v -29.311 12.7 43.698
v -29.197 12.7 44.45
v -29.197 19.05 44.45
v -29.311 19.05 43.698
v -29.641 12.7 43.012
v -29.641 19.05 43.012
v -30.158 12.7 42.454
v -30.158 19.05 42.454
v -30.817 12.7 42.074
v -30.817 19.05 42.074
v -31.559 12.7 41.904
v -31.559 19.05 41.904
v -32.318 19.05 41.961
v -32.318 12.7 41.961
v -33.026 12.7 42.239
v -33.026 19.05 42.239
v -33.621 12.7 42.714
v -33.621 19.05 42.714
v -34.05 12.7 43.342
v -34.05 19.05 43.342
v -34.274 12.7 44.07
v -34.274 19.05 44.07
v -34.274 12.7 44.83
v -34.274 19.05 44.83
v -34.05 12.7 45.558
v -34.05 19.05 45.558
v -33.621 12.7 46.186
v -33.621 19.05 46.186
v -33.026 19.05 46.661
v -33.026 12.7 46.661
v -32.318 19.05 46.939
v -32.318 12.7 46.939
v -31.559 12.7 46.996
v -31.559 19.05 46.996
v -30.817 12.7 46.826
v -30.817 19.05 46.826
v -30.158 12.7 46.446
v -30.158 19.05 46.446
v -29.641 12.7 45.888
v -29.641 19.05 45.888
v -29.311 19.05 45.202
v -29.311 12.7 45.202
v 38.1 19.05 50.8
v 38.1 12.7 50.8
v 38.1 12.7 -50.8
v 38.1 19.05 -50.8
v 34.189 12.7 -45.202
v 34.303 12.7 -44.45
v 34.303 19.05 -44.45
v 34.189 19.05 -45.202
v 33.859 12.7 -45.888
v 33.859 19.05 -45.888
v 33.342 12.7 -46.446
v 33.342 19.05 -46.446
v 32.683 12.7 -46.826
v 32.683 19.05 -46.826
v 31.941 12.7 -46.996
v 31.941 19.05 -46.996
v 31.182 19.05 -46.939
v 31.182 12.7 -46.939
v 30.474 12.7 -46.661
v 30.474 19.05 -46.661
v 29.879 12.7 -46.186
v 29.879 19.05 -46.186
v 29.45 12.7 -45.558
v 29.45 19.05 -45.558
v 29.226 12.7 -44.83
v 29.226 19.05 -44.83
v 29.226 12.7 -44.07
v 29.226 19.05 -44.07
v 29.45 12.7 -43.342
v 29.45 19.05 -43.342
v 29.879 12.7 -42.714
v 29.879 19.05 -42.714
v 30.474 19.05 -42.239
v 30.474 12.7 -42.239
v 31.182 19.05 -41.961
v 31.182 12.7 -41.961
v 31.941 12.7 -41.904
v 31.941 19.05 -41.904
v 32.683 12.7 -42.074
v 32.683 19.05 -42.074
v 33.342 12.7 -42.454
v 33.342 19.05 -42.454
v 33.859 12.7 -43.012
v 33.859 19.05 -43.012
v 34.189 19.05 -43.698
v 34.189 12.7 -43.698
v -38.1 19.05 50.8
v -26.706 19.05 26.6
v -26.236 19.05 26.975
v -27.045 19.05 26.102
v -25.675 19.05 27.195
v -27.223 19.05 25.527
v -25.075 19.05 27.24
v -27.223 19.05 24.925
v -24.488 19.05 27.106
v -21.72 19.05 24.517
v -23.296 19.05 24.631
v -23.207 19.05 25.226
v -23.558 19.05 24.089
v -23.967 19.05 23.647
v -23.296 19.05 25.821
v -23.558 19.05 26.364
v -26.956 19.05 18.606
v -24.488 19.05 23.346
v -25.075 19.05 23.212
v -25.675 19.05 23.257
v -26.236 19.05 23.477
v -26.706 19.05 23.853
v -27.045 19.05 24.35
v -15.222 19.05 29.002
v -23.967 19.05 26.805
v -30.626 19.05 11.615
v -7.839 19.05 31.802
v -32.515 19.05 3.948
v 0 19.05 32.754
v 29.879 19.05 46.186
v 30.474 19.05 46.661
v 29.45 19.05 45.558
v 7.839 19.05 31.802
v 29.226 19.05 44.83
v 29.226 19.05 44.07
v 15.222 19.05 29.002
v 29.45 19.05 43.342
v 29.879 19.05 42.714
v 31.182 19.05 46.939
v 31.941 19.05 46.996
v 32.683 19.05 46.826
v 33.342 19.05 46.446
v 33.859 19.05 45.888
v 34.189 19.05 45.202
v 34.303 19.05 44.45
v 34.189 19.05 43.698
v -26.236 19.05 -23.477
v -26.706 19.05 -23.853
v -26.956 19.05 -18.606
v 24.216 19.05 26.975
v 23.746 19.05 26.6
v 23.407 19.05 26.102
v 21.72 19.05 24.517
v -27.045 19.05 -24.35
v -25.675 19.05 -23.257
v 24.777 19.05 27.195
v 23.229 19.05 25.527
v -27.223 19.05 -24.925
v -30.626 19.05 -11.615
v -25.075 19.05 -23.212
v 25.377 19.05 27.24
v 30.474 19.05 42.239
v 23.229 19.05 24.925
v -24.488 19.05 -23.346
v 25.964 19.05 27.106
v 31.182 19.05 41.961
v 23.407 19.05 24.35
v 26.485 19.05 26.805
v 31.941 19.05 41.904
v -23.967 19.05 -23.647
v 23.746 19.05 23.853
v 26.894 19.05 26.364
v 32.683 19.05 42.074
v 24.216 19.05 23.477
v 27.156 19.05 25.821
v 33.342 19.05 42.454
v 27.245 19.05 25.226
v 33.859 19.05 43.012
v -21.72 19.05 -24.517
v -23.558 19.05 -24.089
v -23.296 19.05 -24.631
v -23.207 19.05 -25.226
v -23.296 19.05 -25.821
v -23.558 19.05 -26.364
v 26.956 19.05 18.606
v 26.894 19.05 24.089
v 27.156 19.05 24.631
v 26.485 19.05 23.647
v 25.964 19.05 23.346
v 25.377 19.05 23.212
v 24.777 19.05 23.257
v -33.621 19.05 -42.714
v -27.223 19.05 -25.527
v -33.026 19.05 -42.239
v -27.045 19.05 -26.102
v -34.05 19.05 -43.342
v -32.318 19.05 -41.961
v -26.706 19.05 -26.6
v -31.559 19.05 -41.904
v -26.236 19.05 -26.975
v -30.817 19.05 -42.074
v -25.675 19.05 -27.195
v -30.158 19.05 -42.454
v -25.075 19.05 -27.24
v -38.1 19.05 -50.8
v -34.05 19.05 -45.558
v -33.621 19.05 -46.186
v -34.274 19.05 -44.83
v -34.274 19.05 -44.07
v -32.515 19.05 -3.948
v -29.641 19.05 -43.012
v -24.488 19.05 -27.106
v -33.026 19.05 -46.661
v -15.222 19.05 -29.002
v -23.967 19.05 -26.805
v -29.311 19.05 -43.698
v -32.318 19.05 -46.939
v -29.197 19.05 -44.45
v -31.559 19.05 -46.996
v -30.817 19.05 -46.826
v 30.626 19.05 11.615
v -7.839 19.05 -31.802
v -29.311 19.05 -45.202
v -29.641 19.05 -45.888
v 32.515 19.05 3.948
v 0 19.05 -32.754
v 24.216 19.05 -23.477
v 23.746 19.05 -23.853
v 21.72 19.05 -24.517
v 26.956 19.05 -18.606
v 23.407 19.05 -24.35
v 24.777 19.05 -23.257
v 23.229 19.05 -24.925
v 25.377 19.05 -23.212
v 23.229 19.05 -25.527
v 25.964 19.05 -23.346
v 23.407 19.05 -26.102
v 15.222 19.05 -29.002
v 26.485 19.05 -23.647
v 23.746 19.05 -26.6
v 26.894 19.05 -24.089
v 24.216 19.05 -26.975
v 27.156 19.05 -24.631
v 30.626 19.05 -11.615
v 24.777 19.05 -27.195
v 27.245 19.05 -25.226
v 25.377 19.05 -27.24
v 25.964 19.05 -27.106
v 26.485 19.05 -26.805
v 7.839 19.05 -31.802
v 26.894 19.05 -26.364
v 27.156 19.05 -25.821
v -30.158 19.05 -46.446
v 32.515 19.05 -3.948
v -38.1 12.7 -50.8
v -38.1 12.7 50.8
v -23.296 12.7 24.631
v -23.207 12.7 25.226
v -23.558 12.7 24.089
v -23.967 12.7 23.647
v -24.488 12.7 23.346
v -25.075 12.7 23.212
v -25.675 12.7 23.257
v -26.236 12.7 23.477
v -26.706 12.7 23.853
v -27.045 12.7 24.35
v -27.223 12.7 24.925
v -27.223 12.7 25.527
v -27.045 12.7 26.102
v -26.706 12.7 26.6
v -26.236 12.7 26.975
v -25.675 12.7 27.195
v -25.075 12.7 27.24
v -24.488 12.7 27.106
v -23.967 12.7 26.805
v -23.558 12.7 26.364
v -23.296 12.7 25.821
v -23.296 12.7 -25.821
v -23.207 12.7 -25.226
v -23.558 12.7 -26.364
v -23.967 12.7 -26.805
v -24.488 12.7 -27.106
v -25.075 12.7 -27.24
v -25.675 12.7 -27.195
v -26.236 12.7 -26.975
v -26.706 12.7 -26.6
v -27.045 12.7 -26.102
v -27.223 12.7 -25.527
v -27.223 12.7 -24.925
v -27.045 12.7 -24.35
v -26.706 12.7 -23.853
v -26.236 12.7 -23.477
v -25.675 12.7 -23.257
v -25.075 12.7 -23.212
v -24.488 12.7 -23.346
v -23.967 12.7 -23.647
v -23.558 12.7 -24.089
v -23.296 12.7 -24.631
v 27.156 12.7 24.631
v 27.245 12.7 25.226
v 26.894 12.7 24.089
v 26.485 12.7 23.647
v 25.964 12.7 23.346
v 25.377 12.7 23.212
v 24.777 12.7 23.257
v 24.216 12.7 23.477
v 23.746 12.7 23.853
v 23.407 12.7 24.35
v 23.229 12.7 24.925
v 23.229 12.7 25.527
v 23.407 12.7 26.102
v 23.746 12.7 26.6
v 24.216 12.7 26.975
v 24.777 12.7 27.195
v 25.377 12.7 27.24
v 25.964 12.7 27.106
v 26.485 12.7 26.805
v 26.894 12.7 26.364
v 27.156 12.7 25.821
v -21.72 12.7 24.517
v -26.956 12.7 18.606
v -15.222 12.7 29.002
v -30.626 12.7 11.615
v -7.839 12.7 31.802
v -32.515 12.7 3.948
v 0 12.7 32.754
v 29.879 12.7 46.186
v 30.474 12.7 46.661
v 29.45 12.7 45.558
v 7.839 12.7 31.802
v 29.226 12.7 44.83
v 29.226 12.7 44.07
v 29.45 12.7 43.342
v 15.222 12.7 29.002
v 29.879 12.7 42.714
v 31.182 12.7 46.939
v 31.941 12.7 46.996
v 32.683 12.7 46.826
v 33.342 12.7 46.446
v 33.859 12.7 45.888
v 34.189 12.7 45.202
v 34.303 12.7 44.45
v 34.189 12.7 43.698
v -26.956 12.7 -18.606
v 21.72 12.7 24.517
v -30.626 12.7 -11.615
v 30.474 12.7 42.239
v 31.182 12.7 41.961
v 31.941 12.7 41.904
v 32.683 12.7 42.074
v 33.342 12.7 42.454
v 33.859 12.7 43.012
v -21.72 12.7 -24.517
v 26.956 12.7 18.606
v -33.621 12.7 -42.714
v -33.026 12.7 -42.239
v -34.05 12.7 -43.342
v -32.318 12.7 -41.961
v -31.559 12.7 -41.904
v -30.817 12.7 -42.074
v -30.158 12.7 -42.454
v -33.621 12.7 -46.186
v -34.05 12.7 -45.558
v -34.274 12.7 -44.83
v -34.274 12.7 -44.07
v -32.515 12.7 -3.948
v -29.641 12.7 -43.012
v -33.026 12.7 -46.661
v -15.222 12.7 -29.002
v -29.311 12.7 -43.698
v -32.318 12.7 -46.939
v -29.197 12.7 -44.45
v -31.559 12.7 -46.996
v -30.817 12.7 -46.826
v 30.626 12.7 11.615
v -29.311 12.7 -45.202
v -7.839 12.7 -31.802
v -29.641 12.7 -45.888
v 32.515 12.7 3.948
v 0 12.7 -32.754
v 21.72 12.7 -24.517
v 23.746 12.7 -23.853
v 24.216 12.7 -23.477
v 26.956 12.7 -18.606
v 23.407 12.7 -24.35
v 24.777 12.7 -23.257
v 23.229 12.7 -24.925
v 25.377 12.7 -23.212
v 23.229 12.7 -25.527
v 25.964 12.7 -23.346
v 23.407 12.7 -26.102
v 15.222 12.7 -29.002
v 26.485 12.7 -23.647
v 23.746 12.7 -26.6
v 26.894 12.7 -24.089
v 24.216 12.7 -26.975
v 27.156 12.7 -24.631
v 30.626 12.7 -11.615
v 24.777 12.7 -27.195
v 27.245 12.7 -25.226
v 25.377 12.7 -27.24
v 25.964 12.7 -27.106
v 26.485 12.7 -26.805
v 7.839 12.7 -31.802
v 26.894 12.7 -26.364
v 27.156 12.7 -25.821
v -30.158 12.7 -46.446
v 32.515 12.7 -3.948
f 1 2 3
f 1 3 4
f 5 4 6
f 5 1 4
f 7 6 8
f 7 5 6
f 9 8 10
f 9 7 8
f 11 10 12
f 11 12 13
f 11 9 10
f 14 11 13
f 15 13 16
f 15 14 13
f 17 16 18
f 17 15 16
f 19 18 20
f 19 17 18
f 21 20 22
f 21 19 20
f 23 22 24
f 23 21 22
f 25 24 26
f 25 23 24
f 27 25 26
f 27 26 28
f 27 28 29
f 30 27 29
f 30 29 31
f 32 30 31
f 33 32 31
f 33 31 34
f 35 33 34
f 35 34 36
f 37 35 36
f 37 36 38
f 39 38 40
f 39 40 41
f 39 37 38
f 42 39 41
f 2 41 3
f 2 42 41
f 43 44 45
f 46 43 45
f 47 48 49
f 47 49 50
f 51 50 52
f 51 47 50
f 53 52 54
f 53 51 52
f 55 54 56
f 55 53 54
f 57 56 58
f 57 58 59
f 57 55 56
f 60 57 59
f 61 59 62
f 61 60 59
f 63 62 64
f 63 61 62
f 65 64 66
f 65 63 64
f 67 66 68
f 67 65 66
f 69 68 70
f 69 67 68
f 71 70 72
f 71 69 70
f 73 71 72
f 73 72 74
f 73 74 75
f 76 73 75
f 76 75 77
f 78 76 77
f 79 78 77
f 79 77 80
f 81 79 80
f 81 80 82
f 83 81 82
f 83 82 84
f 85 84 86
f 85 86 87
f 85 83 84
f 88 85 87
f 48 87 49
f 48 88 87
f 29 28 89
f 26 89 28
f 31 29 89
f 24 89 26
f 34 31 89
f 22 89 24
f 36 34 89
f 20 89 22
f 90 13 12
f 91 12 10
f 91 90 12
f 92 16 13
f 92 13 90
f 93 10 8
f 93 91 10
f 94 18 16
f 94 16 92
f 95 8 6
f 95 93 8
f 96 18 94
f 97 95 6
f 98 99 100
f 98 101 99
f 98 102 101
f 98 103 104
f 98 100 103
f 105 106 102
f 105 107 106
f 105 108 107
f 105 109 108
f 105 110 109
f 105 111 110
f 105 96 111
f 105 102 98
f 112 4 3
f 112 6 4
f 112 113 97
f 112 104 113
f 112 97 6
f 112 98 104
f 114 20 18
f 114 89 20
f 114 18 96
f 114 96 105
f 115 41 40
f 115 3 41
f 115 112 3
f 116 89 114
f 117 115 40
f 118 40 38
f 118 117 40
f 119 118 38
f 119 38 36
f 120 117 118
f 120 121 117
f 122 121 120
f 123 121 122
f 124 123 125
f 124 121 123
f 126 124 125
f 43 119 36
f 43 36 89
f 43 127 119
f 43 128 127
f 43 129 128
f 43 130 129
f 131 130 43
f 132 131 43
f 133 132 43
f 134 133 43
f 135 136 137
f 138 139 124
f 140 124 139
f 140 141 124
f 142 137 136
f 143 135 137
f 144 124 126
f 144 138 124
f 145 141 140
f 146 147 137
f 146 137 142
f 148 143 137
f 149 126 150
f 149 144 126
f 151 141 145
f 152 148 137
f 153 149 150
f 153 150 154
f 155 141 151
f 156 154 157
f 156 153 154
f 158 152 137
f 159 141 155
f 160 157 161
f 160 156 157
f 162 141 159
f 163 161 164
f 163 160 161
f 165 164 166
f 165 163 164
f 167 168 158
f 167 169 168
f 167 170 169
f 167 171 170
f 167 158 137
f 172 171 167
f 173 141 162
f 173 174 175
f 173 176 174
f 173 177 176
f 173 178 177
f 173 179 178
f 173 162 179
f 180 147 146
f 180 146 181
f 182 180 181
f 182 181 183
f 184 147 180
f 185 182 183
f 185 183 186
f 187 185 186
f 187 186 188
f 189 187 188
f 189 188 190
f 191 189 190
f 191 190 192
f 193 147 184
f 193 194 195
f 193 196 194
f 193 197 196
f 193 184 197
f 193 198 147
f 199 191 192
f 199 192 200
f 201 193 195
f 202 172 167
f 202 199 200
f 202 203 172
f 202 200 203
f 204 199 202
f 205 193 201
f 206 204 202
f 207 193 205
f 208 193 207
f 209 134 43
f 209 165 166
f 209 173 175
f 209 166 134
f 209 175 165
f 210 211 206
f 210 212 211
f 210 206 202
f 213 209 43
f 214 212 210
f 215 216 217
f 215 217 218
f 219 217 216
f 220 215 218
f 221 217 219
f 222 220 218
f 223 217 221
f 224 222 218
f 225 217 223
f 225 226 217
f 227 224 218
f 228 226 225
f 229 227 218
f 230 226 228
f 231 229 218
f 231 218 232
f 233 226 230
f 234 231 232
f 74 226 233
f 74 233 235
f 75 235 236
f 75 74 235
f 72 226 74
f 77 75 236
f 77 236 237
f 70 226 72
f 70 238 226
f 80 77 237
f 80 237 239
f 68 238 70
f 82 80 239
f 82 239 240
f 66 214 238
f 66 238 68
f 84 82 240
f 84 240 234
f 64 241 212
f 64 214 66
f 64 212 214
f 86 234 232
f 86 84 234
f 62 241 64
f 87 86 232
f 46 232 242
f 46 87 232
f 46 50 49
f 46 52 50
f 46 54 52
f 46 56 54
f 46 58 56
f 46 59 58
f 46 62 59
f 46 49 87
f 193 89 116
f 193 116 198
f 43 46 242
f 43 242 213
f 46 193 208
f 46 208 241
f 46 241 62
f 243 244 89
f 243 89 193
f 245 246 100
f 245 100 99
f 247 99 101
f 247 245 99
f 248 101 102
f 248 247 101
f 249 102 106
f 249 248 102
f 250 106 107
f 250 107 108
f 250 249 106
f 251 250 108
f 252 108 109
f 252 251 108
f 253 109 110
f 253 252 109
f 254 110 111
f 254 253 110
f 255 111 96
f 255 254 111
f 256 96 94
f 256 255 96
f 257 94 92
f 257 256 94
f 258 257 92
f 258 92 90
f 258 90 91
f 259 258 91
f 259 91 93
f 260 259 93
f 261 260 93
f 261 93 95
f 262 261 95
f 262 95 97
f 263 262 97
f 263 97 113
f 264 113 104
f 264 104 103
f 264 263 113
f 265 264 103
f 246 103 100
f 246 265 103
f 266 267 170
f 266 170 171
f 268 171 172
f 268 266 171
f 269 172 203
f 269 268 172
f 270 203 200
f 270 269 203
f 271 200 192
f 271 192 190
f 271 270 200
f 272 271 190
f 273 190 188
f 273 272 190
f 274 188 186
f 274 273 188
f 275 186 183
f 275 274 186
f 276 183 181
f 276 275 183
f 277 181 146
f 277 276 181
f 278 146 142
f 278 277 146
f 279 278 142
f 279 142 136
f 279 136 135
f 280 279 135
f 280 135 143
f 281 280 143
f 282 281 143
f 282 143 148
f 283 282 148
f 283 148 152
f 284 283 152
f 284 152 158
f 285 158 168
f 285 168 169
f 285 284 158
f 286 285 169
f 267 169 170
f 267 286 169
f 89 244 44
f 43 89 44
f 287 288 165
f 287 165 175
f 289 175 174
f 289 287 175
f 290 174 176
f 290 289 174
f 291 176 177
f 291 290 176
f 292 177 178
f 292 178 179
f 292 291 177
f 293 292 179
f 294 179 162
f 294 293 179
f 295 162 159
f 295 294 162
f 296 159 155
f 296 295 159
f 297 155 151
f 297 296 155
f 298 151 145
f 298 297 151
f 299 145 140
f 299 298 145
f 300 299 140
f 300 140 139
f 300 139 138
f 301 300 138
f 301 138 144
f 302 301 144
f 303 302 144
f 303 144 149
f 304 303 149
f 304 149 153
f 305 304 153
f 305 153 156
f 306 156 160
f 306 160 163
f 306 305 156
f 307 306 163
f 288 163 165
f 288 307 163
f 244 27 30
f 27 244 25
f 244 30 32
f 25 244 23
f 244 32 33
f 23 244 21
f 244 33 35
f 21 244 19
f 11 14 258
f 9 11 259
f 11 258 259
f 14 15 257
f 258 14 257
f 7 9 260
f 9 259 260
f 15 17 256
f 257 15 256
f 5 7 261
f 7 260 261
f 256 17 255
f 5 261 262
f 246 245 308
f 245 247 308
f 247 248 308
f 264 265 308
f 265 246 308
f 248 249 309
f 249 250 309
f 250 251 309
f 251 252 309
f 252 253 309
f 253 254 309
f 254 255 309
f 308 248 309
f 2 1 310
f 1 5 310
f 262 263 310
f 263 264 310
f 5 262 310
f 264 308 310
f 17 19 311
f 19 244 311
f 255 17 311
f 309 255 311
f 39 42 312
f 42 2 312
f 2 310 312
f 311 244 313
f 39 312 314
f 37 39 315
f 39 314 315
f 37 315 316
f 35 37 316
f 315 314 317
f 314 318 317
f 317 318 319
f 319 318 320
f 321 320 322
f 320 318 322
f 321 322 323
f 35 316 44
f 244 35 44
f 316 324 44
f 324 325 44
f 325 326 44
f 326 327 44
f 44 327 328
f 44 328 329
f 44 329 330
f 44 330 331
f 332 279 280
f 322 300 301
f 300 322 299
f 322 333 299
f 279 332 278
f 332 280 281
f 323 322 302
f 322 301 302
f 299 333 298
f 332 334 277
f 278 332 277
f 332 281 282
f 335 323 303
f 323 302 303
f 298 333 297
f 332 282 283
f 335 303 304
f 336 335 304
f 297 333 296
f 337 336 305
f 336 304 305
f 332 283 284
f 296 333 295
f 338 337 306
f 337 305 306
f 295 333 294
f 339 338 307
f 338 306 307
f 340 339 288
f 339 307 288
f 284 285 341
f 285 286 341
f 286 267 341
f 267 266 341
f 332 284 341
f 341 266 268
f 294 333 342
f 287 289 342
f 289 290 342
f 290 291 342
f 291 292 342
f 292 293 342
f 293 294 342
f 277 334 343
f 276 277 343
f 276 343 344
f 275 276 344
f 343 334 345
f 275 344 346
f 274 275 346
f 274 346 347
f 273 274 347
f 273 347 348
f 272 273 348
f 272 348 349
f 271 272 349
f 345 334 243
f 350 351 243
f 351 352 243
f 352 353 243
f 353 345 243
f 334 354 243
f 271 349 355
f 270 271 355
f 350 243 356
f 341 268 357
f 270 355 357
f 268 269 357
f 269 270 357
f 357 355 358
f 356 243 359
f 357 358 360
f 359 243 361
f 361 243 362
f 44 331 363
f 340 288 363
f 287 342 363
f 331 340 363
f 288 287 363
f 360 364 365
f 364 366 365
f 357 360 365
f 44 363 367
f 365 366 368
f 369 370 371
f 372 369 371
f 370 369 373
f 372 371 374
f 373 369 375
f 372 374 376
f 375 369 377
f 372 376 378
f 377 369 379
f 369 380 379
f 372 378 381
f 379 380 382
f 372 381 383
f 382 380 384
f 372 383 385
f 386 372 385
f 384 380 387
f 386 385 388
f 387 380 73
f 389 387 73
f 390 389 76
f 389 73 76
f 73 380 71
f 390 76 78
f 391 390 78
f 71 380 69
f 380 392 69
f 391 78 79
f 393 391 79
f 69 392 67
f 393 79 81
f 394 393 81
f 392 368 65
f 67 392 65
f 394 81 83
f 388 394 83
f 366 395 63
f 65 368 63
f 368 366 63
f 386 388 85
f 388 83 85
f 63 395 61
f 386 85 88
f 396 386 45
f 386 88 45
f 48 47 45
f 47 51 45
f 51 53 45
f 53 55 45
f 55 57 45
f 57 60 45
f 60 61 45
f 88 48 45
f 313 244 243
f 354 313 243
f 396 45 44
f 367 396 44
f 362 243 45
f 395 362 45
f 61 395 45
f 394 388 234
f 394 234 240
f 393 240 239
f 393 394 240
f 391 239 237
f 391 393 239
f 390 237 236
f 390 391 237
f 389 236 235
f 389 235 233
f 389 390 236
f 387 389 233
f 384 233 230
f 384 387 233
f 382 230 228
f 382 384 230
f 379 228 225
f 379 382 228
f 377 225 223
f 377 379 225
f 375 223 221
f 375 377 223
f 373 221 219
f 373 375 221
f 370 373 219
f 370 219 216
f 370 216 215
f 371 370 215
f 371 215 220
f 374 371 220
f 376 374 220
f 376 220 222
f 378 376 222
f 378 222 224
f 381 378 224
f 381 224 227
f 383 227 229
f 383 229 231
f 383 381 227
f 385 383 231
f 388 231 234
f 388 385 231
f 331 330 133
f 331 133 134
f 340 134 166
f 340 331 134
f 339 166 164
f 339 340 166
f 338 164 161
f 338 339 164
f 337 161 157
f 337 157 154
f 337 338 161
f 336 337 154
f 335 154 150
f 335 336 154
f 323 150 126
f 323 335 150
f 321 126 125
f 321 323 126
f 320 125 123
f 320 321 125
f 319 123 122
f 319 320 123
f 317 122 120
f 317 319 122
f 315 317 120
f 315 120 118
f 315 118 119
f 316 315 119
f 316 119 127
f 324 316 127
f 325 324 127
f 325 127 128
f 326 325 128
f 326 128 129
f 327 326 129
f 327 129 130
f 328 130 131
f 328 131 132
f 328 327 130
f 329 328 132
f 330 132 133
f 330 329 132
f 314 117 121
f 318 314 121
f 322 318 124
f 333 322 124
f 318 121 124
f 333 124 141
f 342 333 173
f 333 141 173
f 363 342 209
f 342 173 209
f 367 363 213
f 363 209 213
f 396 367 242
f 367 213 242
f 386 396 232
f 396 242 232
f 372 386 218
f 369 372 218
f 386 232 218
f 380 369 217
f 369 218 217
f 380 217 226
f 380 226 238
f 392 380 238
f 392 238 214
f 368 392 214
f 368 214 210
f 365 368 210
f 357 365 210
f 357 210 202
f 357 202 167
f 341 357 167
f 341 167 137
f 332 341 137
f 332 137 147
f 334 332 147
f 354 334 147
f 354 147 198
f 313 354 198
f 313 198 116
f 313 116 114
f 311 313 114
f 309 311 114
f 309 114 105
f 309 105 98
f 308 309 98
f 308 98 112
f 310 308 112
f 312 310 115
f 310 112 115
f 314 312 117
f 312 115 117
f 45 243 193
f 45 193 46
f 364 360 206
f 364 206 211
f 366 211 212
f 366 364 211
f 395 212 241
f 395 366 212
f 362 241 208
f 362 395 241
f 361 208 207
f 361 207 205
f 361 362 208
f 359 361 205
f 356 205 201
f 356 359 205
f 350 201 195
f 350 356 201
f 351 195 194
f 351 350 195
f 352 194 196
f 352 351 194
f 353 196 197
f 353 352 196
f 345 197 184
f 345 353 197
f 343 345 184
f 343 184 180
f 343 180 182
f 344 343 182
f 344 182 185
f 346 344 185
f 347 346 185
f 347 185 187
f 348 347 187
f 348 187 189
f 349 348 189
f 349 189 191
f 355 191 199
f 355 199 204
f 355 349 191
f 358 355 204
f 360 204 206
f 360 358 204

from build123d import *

# Parameters (mm, degrees)
STOCK_GEARBOX_START                           = 12.7
STOCK_GEARBOX_WHEEL_PROTOTYPE_STRUCT_2_W      = 76.2
STOCK_GEARBOX_WHEEL_PROTOTYPE_STRUCT_2_H      = 101.6
STOCK_GEARBOX_WHEEL_PROTOTYPE_STRUCT_2_R      = 2.5527
STOCK_GEARBOX_WHEEL_PROTOTYPE_STRUCT_2_R_2    = 2.0193
STOCK_GEARBOX_WHEEL_PROTOTYPE_STRUCT_2_R_3    = 32.5
STOCK_GEARBOX_WHEEL_PROTOTYPE_STRUCTURE_DEPTH = 6.35
SKETCH1_R                                     = 32.754
CUT_EXTRUDE1_DEPTH                            = 64.816710194


# Read off the part's stored shape, not the designer's step: Stock-Gearbox Wheel Prototype Structure-1
with BuildPart() as part:
    # Stock-Gearbox Wheel Prototype Struct 2 → Stock-Gearbox Wheel Prototype Structure-1 (new body)
    with BuildSketch(Plane(origin=(0, 0, 0), x_dir=(1, 0, 0), z_dir=(0, 1, 0)).offset(STOCK_GEARBOX_START)):
        Rectangle(STOCK_GEARBOX_WHEEL_PROTOTYPE_STRUCT_2_W, STOCK_GEARBOX_WHEEL_PROTOTYPE_STRUCT_2_H)
        with Locations((-31.75, -44.45)):
            Circle(STOCK_GEARBOX_WHEEL_PROTOTYPE_STRUCT_2_R, mode=Mode.SUBTRACT)
        with Locations((-25.226034419, -25.226034419)):
            Circle(STOCK_GEARBOX_WHEEL_PROTOTYPE_STRUCT_2_R_2, mode=Mode.SUBTRACT)
        with Locations((31.75, -44.45)):
            Circle(STOCK_GEARBOX_WHEEL_PROTOTYPE_STRUCT_2_R, mode=Mode.SUBTRACT)
        Circle(STOCK_GEARBOX_WHEEL_PROTOTYPE_STRUCT_2_R_3, mode=Mode.SUBTRACT)
        with Locations((25.226034419, -25.226034419)):
            Circle(STOCK_GEARBOX_WHEEL_PROTOTYPE_STRUCT_2_R_2, mode=Mode.SUBTRACT)
        with Locations((-25.226034419, 25.226034419)):
            Circle(STOCK_GEARBOX_WHEEL_PROTOTYPE_STRUCT_2_R_2, mode=Mode.SUBTRACT)
        with Locations((-31.75, 44.45)):
            Circle(STOCK_GEARBOX_WHEEL_PROTOTYPE_STRUCT_2_R, mode=Mode.SUBTRACT)
        with Locations((25.226034419, 25.226034419)):
            Circle(STOCK_GEARBOX_WHEEL_PROTOTYPE_STRUCT_2_R_2, mode=Mode.SUBTRACT)
        with Locations((31.75, 44.45)):
            Circle(STOCK_GEARBOX_WHEEL_PROTOTYPE_STRUCT_2_R, mode=Mode.SUBTRACT)
    extrude(amount=STOCK_GEARBOX_WHEEL_PROTOTYPE_STRUCTURE_DEPTH)

    # Sketch1 → Cut-Extrude1 (cut, through all)
    with BuildSketch(Plane(origin=(0, 19.05, 0), x_dir=(1, 0, 0), z_dir=(0, 1, 0))):
        with Locations(Location((0, 0, 0), (0, 0, 270))):
            Circle(SKETCH1_R)
    extrude(amount=-CUT_EXTRUDE1_DEPTH, mode=Mode.SUBTRACT)


solid = part.part
